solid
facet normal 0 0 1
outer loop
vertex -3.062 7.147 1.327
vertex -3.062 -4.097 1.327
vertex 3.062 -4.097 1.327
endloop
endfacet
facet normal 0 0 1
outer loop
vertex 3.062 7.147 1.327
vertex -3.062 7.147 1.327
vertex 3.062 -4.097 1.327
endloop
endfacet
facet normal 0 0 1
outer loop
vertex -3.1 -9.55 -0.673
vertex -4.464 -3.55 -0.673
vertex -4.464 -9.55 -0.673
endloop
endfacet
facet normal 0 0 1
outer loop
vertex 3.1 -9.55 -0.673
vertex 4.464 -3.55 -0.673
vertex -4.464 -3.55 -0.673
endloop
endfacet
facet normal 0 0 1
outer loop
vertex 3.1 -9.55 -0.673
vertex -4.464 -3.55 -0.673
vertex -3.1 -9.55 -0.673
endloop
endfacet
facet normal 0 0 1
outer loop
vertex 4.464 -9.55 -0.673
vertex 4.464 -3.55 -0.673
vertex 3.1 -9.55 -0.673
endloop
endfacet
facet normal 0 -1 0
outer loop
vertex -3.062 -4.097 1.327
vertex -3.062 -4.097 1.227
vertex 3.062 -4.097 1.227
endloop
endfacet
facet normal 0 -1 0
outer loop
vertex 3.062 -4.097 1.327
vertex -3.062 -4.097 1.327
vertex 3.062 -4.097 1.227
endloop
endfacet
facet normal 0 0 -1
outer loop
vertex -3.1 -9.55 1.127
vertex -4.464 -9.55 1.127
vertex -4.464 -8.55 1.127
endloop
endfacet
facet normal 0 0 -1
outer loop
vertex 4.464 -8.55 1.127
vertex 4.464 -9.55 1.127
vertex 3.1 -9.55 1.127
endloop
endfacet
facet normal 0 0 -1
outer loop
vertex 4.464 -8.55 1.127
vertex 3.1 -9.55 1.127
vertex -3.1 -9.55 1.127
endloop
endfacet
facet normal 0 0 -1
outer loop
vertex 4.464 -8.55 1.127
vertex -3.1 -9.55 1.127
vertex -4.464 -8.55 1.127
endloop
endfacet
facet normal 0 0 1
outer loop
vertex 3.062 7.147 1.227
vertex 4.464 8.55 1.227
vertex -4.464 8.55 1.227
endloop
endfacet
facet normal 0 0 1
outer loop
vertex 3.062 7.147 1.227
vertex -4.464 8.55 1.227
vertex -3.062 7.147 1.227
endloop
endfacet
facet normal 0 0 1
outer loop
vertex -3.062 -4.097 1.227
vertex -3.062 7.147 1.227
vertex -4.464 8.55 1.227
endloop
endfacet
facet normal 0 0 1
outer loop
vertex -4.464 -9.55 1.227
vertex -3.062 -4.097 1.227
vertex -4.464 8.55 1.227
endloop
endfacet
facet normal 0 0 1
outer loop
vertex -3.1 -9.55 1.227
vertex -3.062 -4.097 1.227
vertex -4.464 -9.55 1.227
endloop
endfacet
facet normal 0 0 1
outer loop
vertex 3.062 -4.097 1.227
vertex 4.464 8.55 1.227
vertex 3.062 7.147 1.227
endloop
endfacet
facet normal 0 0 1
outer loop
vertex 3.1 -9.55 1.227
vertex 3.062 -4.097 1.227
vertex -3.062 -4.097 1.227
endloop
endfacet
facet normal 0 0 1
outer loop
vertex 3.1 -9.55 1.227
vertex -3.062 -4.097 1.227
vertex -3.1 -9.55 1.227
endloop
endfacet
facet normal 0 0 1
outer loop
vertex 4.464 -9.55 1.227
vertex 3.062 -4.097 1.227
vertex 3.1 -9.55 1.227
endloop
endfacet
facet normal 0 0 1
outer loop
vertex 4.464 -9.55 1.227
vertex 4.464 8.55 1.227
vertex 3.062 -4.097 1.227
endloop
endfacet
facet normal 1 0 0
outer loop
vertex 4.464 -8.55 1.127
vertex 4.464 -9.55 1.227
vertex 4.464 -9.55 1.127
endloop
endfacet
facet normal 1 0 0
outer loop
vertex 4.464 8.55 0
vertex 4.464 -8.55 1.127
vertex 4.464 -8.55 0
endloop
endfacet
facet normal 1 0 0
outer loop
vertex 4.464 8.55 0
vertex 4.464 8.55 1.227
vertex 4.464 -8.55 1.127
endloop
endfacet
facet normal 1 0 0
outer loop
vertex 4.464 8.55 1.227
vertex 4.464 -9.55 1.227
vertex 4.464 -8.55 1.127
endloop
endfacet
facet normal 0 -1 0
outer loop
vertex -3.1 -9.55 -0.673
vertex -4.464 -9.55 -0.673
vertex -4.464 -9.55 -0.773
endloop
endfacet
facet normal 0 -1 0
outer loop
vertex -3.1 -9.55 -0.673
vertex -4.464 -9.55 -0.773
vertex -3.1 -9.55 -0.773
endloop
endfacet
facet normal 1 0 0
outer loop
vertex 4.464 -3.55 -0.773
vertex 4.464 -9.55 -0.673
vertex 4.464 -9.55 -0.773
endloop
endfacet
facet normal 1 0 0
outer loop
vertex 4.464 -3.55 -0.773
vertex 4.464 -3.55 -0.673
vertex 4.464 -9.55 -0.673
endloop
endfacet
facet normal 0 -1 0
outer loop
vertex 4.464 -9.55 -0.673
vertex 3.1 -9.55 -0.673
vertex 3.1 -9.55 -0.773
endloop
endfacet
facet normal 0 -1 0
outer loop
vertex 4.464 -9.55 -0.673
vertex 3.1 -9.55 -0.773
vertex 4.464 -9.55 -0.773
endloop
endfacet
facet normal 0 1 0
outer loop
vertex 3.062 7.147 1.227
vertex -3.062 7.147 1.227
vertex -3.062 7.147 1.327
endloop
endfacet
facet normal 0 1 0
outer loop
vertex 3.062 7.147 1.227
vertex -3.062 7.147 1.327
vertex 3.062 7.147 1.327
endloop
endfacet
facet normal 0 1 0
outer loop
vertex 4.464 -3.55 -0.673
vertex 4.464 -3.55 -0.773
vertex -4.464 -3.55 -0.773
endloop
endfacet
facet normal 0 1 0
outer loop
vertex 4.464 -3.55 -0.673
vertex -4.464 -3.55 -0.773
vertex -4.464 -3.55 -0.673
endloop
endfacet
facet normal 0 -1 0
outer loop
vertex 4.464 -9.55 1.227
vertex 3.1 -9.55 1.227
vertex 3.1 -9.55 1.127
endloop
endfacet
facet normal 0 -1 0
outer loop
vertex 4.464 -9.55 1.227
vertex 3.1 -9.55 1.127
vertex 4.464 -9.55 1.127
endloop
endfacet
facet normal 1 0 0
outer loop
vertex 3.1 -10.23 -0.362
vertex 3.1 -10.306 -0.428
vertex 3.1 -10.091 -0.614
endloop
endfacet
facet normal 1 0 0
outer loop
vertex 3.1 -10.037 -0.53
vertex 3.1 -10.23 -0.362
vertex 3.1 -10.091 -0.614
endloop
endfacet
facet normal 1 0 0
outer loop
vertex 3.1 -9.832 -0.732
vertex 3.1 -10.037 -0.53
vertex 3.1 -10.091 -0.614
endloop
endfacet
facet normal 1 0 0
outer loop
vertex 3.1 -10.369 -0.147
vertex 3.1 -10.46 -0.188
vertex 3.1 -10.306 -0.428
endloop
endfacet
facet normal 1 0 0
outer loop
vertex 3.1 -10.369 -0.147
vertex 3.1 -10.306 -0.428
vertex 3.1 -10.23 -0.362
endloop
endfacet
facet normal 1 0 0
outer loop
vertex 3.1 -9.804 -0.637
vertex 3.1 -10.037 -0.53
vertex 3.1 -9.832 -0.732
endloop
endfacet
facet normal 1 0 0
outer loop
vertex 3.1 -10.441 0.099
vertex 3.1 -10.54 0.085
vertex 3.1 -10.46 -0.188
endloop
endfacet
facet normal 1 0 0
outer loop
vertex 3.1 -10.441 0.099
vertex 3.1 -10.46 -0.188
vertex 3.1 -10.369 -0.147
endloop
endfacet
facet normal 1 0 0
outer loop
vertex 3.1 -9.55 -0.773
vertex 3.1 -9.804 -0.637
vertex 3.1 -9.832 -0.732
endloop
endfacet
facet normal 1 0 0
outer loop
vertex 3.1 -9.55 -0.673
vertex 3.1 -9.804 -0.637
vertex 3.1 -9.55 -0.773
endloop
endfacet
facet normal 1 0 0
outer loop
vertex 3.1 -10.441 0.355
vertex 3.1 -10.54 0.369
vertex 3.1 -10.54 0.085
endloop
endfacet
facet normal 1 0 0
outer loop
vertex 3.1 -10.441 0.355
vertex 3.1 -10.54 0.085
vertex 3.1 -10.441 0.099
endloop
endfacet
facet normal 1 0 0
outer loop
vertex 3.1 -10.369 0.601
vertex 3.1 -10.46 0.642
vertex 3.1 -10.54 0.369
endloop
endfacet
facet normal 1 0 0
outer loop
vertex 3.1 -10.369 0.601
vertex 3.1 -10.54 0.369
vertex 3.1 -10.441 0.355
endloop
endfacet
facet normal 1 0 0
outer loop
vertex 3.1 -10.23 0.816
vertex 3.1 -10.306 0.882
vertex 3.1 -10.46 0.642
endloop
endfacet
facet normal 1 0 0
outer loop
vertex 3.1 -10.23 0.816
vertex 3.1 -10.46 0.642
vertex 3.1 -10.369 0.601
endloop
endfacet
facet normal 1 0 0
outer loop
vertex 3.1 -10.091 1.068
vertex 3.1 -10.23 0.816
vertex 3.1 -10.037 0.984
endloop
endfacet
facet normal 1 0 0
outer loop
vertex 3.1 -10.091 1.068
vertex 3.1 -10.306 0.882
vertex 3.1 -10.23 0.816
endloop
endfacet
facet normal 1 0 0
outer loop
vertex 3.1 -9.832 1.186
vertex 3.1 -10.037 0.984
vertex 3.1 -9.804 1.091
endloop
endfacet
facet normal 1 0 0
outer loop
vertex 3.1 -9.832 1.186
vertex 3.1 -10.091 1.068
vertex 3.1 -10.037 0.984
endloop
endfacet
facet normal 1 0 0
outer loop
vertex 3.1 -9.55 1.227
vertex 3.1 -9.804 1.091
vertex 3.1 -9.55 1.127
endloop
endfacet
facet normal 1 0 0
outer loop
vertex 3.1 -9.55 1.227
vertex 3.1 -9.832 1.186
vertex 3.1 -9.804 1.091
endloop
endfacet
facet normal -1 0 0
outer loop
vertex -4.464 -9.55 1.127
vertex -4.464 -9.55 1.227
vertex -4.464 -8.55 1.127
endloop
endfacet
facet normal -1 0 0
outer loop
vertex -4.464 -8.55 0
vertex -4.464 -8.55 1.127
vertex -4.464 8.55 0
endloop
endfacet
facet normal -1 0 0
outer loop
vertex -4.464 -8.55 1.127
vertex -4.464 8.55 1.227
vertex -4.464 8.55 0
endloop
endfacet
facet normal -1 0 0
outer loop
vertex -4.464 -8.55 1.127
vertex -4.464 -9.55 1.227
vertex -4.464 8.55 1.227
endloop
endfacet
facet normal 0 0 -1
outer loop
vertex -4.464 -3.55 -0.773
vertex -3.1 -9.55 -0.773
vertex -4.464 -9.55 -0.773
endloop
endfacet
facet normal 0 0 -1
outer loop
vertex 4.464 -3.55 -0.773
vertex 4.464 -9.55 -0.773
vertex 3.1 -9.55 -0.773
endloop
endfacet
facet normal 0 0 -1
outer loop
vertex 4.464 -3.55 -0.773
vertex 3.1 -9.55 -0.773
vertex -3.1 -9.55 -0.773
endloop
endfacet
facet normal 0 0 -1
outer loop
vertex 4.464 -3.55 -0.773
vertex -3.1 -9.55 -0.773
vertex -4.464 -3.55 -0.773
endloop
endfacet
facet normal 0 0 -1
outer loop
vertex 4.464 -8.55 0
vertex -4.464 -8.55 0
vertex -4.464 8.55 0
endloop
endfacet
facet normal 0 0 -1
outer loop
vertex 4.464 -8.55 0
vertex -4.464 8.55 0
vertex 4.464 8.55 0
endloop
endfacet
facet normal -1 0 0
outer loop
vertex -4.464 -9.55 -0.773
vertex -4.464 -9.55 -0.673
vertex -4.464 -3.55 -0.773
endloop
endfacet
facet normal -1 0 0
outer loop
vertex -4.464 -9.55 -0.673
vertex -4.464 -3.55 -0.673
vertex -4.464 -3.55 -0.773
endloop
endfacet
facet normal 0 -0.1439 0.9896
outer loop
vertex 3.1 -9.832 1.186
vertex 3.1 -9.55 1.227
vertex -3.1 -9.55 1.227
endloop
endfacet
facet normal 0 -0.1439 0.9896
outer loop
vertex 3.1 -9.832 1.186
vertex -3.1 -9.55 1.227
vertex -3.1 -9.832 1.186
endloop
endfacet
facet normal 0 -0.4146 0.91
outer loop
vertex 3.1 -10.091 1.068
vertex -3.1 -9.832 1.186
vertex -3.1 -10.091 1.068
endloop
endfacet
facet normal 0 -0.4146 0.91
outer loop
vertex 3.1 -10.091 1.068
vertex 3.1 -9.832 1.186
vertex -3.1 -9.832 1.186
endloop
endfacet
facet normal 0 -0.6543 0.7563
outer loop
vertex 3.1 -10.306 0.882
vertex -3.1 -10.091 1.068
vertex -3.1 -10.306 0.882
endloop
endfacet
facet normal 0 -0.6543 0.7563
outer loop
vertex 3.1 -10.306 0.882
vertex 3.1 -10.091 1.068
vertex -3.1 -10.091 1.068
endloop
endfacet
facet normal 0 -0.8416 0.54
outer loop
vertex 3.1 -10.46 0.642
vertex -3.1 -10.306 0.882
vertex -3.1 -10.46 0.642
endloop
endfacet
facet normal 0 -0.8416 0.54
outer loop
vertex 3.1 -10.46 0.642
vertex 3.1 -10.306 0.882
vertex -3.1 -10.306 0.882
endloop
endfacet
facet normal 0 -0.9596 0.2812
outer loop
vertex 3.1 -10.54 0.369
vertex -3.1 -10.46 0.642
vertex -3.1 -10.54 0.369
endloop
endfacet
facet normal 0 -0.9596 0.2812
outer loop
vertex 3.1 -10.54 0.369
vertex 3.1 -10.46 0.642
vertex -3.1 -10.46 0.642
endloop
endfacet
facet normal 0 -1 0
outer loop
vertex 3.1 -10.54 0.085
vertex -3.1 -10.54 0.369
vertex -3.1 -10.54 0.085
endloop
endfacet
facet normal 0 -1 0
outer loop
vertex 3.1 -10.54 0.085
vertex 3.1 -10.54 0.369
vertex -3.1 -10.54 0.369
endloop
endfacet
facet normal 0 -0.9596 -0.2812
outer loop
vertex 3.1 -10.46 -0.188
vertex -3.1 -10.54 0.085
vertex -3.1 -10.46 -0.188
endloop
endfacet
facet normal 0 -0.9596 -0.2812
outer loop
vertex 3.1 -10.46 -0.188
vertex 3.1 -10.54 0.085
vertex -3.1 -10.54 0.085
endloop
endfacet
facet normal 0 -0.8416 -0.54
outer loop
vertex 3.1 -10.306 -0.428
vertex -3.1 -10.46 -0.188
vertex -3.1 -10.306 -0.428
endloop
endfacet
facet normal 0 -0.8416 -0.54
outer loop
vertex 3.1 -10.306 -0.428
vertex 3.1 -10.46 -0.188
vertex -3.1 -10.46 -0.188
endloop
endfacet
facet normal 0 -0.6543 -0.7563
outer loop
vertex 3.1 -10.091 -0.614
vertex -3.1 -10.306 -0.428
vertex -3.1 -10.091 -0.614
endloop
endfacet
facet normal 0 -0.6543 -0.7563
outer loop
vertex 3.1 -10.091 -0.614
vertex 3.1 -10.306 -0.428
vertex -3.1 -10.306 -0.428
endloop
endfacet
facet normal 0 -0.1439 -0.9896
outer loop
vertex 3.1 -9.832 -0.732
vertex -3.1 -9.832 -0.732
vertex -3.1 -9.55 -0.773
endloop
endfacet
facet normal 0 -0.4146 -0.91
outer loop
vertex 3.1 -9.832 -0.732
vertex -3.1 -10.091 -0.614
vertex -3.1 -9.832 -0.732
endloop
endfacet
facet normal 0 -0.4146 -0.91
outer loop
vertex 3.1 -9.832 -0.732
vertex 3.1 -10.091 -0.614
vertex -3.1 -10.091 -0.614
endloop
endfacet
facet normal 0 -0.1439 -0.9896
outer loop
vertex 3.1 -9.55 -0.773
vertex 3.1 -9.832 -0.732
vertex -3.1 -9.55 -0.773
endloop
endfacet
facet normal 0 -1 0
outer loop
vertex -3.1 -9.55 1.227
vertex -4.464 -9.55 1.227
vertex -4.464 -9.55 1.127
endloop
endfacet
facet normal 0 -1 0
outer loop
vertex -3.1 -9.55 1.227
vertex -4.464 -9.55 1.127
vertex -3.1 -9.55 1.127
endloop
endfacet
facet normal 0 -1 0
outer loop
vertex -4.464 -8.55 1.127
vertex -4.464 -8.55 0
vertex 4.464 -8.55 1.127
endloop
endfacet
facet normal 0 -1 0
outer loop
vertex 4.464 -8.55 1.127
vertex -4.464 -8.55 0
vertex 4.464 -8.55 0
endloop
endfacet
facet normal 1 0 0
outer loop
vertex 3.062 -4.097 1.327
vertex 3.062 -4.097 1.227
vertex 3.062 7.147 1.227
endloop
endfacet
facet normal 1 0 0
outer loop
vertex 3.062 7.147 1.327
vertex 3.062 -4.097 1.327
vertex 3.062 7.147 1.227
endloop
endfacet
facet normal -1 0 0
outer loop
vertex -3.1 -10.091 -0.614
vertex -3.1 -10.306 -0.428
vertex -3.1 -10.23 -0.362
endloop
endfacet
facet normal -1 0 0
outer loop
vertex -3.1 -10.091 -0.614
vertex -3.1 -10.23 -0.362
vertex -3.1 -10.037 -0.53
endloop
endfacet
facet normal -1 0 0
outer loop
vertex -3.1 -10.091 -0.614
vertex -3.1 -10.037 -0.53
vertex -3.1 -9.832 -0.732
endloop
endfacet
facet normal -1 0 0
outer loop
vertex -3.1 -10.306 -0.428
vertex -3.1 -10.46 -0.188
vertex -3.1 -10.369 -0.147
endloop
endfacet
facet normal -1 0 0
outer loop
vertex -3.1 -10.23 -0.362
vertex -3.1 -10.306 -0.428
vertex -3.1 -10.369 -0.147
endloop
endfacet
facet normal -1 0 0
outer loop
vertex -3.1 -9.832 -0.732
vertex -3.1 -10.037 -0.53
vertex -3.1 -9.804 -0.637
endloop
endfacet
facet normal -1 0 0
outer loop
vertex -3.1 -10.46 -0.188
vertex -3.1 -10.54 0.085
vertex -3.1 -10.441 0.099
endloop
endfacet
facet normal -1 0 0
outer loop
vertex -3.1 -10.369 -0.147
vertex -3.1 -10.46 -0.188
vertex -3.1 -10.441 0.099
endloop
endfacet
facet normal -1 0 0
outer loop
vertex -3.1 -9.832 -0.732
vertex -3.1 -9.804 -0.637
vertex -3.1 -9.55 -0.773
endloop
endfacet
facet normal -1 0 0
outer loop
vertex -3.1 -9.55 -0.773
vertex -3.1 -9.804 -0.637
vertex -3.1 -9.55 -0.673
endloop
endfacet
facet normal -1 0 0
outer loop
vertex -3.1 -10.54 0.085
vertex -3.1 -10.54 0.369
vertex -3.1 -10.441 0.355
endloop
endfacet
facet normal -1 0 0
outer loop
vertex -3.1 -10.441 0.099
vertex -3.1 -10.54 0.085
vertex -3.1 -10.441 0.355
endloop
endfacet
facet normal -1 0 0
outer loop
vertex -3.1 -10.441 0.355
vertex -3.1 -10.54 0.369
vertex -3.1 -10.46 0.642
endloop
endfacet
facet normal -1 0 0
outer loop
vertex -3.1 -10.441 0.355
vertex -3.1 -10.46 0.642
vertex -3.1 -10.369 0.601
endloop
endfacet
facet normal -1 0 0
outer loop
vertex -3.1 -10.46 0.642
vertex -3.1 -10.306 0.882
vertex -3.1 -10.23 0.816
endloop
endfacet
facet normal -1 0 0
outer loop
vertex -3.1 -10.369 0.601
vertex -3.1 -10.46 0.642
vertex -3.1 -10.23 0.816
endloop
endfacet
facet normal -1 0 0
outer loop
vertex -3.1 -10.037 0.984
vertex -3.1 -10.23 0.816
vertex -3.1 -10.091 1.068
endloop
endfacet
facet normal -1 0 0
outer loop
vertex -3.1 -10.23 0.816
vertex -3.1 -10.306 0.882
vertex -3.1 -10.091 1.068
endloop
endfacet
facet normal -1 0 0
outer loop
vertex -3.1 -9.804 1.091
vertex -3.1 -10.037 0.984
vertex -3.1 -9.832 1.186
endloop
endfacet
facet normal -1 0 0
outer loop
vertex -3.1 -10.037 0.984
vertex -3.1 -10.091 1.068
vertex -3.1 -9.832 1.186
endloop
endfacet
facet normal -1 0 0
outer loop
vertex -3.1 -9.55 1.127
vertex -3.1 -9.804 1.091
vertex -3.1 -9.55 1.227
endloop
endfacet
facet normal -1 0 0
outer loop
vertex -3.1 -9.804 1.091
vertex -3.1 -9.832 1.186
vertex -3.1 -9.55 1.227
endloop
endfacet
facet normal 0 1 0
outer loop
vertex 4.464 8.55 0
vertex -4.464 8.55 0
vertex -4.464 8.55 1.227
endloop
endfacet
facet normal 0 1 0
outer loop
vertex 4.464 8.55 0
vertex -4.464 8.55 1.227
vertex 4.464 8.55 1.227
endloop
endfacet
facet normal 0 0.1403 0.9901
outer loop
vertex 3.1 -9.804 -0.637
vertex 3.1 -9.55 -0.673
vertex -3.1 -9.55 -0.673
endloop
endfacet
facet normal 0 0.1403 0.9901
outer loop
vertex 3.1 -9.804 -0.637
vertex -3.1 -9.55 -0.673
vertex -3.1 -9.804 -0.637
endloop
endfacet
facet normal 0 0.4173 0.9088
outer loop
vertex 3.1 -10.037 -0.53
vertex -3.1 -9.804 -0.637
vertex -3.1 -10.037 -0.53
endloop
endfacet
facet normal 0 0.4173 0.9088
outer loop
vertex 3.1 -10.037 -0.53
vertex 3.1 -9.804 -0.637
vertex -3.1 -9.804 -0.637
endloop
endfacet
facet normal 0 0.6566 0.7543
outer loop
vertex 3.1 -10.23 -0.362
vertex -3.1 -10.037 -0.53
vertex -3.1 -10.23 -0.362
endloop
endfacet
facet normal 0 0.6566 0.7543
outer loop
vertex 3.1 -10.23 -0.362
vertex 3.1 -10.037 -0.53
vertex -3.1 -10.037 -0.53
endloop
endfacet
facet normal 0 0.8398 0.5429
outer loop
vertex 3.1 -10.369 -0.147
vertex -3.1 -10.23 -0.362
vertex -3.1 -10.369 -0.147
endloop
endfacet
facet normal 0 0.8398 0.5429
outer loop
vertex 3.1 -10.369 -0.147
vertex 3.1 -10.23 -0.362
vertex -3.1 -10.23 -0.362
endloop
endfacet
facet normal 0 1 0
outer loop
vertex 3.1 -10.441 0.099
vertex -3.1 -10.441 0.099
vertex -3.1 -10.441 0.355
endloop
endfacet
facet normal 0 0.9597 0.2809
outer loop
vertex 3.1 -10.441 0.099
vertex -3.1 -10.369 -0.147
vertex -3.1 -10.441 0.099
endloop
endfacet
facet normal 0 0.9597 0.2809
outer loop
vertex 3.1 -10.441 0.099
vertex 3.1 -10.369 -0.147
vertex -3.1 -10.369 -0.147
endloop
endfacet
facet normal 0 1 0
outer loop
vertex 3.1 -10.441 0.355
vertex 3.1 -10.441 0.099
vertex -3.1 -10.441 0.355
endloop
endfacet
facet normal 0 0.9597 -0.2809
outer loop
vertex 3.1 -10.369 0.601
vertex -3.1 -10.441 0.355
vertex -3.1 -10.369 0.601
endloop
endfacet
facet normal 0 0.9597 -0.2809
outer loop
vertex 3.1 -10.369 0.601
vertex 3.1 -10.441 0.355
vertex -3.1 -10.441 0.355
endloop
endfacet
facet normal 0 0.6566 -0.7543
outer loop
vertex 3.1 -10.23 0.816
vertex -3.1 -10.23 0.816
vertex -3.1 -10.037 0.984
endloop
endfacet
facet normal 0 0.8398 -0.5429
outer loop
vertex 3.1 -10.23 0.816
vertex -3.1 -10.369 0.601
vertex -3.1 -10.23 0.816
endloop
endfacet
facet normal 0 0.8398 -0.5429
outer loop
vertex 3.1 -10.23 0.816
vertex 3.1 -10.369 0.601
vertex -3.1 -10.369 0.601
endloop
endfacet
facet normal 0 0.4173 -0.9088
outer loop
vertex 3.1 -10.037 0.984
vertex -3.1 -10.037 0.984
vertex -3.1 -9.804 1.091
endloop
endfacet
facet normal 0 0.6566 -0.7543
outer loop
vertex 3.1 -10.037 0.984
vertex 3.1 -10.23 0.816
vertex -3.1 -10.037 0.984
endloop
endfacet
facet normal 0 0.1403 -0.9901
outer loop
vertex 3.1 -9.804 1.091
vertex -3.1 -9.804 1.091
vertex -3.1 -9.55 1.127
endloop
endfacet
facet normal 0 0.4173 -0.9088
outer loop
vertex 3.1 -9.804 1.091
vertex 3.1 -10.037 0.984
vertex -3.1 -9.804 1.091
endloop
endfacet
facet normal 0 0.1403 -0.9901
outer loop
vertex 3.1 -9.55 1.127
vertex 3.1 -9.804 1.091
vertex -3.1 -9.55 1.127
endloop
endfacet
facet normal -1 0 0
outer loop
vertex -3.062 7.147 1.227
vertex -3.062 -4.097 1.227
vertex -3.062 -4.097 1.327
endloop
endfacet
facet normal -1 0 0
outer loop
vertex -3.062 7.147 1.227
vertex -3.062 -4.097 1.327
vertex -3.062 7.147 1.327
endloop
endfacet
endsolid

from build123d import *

# Parameters (mm, degrees)
ESQUISSE1_W             = 8.928
ESQUISSE1_H             = 17.1
BOSS_EXTRU_1_DEPTH      = 1.227
ESQUISSE2_W             = 6.124
ESQUISSE2_H             = 11.244
BOSS_EXTRU_2_DEPTH      = 0.1
BOSS_EXTRU_4_DEPTH      = 8.928
ENL_V_MAT_EXTRU_1_REACH = 13.629
ESQUISSE5_W             = 1.364
ESQUISSE5_H             = 1


with BuildPart() as part:
    # Esquisse1 → Boss.-Extru.1 (new body)
    with BuildSketch(Plane.XY):
        Rectangle(ESQUISSE1_W, ESQUISSE1_H)
    extrude(amount=BOSS_EXTRU_1_DEPTH)

    # Esquisse2 → Boss.-Extru.2 (add)
    with BuildSketch(Plane.XY.offset(1.227)):
        with Locations((0, 1.525)):
            Rectangle(ESQUISSE2_W, ESQUISSE2_H)
    extrude(amount=BOSS_EXTRU_2_DEPTH)

    # Esquisse4 → Boss.-Extru.4 (add)
    with BuildSketch(Plane(origin=(4.464, 0, 0), x_dir=(0, 0, -1), z_dir=(1, 0, 0))):
        with BuildLine():
            Line((-1.227, -8.55), (-1.227, -9.55))
            ThreePointArc((-1.227, -9.55), (-0.227, -10.55), (0.773, -9.55))
            Line((0.773, -9.55), (0.773, -3.55))
            Line((0.773, -3.55), (0.673, -3.55))
            Line((0.673, -3.55), (0.673, -9.55))
            ThreePointArc((0.673, -9.55), (-0.227, -10.45), (-1.127, -9.55))
            Line((-1.127, -9.55), (-1.127, -8.55))
            Line((-1.127, -8.55), (-1.227, -8.55))
        make_face()
    extrude(amount=-BOSS_EXTRU_4_DEPTH)

    # Esquisse5 → Enlèv. mat.-Extru.1 (cut, up to next)
    with BuildSketch(Plane.XY.offset(1.227), mode=Mode.PRIVATE) as enl_v_mat_extru_1_sk1:
        with Locations((3.782, -10.05)):
            Rectangle(ESQUISSE5_W, ESQUISSE5_H)
    enl_v_mat_extru_1_tool1 = extrude(enl_v_mat_extru_1_sk1.sketch, amount=-ENL_V_MAT_EXTRU_1_REACH, mode=Mode.PRIVATE) & part.part
    # Esquisse5 → Enlèv. mat.-Extru.1 (cut, up to next)
    with BuildSketch(Plane.XY.offset(1.227), mode=Mode.PRIVATE) as enl_v_mat_extru_1_sk2:
        with Locations((-3.782, -10.05)):
            Rectangle(ESQUISSE5_W, ESQUISSE5_H)
    enl_v_mat_extru_1_tool2 = extrude(enl_v_mat_extru_1_sk2.sketch, amount=-ENL_V_MAT_EXTRU_1_REACH, mode=Mode.PRIVATE) & part.part
    add(enl_v_mat_extru_1_tool1.solids().sort_by_distance((3.782, -10.05, 1.227))[0], mode=Mode.SUBTRACT)
    add(enl_v_mat_extru_1_tool2.solids().sort_by_distance((-3.782, -10.05, 1.227))[0], mode=Mode.SUBTRACT)


solid = part.part
